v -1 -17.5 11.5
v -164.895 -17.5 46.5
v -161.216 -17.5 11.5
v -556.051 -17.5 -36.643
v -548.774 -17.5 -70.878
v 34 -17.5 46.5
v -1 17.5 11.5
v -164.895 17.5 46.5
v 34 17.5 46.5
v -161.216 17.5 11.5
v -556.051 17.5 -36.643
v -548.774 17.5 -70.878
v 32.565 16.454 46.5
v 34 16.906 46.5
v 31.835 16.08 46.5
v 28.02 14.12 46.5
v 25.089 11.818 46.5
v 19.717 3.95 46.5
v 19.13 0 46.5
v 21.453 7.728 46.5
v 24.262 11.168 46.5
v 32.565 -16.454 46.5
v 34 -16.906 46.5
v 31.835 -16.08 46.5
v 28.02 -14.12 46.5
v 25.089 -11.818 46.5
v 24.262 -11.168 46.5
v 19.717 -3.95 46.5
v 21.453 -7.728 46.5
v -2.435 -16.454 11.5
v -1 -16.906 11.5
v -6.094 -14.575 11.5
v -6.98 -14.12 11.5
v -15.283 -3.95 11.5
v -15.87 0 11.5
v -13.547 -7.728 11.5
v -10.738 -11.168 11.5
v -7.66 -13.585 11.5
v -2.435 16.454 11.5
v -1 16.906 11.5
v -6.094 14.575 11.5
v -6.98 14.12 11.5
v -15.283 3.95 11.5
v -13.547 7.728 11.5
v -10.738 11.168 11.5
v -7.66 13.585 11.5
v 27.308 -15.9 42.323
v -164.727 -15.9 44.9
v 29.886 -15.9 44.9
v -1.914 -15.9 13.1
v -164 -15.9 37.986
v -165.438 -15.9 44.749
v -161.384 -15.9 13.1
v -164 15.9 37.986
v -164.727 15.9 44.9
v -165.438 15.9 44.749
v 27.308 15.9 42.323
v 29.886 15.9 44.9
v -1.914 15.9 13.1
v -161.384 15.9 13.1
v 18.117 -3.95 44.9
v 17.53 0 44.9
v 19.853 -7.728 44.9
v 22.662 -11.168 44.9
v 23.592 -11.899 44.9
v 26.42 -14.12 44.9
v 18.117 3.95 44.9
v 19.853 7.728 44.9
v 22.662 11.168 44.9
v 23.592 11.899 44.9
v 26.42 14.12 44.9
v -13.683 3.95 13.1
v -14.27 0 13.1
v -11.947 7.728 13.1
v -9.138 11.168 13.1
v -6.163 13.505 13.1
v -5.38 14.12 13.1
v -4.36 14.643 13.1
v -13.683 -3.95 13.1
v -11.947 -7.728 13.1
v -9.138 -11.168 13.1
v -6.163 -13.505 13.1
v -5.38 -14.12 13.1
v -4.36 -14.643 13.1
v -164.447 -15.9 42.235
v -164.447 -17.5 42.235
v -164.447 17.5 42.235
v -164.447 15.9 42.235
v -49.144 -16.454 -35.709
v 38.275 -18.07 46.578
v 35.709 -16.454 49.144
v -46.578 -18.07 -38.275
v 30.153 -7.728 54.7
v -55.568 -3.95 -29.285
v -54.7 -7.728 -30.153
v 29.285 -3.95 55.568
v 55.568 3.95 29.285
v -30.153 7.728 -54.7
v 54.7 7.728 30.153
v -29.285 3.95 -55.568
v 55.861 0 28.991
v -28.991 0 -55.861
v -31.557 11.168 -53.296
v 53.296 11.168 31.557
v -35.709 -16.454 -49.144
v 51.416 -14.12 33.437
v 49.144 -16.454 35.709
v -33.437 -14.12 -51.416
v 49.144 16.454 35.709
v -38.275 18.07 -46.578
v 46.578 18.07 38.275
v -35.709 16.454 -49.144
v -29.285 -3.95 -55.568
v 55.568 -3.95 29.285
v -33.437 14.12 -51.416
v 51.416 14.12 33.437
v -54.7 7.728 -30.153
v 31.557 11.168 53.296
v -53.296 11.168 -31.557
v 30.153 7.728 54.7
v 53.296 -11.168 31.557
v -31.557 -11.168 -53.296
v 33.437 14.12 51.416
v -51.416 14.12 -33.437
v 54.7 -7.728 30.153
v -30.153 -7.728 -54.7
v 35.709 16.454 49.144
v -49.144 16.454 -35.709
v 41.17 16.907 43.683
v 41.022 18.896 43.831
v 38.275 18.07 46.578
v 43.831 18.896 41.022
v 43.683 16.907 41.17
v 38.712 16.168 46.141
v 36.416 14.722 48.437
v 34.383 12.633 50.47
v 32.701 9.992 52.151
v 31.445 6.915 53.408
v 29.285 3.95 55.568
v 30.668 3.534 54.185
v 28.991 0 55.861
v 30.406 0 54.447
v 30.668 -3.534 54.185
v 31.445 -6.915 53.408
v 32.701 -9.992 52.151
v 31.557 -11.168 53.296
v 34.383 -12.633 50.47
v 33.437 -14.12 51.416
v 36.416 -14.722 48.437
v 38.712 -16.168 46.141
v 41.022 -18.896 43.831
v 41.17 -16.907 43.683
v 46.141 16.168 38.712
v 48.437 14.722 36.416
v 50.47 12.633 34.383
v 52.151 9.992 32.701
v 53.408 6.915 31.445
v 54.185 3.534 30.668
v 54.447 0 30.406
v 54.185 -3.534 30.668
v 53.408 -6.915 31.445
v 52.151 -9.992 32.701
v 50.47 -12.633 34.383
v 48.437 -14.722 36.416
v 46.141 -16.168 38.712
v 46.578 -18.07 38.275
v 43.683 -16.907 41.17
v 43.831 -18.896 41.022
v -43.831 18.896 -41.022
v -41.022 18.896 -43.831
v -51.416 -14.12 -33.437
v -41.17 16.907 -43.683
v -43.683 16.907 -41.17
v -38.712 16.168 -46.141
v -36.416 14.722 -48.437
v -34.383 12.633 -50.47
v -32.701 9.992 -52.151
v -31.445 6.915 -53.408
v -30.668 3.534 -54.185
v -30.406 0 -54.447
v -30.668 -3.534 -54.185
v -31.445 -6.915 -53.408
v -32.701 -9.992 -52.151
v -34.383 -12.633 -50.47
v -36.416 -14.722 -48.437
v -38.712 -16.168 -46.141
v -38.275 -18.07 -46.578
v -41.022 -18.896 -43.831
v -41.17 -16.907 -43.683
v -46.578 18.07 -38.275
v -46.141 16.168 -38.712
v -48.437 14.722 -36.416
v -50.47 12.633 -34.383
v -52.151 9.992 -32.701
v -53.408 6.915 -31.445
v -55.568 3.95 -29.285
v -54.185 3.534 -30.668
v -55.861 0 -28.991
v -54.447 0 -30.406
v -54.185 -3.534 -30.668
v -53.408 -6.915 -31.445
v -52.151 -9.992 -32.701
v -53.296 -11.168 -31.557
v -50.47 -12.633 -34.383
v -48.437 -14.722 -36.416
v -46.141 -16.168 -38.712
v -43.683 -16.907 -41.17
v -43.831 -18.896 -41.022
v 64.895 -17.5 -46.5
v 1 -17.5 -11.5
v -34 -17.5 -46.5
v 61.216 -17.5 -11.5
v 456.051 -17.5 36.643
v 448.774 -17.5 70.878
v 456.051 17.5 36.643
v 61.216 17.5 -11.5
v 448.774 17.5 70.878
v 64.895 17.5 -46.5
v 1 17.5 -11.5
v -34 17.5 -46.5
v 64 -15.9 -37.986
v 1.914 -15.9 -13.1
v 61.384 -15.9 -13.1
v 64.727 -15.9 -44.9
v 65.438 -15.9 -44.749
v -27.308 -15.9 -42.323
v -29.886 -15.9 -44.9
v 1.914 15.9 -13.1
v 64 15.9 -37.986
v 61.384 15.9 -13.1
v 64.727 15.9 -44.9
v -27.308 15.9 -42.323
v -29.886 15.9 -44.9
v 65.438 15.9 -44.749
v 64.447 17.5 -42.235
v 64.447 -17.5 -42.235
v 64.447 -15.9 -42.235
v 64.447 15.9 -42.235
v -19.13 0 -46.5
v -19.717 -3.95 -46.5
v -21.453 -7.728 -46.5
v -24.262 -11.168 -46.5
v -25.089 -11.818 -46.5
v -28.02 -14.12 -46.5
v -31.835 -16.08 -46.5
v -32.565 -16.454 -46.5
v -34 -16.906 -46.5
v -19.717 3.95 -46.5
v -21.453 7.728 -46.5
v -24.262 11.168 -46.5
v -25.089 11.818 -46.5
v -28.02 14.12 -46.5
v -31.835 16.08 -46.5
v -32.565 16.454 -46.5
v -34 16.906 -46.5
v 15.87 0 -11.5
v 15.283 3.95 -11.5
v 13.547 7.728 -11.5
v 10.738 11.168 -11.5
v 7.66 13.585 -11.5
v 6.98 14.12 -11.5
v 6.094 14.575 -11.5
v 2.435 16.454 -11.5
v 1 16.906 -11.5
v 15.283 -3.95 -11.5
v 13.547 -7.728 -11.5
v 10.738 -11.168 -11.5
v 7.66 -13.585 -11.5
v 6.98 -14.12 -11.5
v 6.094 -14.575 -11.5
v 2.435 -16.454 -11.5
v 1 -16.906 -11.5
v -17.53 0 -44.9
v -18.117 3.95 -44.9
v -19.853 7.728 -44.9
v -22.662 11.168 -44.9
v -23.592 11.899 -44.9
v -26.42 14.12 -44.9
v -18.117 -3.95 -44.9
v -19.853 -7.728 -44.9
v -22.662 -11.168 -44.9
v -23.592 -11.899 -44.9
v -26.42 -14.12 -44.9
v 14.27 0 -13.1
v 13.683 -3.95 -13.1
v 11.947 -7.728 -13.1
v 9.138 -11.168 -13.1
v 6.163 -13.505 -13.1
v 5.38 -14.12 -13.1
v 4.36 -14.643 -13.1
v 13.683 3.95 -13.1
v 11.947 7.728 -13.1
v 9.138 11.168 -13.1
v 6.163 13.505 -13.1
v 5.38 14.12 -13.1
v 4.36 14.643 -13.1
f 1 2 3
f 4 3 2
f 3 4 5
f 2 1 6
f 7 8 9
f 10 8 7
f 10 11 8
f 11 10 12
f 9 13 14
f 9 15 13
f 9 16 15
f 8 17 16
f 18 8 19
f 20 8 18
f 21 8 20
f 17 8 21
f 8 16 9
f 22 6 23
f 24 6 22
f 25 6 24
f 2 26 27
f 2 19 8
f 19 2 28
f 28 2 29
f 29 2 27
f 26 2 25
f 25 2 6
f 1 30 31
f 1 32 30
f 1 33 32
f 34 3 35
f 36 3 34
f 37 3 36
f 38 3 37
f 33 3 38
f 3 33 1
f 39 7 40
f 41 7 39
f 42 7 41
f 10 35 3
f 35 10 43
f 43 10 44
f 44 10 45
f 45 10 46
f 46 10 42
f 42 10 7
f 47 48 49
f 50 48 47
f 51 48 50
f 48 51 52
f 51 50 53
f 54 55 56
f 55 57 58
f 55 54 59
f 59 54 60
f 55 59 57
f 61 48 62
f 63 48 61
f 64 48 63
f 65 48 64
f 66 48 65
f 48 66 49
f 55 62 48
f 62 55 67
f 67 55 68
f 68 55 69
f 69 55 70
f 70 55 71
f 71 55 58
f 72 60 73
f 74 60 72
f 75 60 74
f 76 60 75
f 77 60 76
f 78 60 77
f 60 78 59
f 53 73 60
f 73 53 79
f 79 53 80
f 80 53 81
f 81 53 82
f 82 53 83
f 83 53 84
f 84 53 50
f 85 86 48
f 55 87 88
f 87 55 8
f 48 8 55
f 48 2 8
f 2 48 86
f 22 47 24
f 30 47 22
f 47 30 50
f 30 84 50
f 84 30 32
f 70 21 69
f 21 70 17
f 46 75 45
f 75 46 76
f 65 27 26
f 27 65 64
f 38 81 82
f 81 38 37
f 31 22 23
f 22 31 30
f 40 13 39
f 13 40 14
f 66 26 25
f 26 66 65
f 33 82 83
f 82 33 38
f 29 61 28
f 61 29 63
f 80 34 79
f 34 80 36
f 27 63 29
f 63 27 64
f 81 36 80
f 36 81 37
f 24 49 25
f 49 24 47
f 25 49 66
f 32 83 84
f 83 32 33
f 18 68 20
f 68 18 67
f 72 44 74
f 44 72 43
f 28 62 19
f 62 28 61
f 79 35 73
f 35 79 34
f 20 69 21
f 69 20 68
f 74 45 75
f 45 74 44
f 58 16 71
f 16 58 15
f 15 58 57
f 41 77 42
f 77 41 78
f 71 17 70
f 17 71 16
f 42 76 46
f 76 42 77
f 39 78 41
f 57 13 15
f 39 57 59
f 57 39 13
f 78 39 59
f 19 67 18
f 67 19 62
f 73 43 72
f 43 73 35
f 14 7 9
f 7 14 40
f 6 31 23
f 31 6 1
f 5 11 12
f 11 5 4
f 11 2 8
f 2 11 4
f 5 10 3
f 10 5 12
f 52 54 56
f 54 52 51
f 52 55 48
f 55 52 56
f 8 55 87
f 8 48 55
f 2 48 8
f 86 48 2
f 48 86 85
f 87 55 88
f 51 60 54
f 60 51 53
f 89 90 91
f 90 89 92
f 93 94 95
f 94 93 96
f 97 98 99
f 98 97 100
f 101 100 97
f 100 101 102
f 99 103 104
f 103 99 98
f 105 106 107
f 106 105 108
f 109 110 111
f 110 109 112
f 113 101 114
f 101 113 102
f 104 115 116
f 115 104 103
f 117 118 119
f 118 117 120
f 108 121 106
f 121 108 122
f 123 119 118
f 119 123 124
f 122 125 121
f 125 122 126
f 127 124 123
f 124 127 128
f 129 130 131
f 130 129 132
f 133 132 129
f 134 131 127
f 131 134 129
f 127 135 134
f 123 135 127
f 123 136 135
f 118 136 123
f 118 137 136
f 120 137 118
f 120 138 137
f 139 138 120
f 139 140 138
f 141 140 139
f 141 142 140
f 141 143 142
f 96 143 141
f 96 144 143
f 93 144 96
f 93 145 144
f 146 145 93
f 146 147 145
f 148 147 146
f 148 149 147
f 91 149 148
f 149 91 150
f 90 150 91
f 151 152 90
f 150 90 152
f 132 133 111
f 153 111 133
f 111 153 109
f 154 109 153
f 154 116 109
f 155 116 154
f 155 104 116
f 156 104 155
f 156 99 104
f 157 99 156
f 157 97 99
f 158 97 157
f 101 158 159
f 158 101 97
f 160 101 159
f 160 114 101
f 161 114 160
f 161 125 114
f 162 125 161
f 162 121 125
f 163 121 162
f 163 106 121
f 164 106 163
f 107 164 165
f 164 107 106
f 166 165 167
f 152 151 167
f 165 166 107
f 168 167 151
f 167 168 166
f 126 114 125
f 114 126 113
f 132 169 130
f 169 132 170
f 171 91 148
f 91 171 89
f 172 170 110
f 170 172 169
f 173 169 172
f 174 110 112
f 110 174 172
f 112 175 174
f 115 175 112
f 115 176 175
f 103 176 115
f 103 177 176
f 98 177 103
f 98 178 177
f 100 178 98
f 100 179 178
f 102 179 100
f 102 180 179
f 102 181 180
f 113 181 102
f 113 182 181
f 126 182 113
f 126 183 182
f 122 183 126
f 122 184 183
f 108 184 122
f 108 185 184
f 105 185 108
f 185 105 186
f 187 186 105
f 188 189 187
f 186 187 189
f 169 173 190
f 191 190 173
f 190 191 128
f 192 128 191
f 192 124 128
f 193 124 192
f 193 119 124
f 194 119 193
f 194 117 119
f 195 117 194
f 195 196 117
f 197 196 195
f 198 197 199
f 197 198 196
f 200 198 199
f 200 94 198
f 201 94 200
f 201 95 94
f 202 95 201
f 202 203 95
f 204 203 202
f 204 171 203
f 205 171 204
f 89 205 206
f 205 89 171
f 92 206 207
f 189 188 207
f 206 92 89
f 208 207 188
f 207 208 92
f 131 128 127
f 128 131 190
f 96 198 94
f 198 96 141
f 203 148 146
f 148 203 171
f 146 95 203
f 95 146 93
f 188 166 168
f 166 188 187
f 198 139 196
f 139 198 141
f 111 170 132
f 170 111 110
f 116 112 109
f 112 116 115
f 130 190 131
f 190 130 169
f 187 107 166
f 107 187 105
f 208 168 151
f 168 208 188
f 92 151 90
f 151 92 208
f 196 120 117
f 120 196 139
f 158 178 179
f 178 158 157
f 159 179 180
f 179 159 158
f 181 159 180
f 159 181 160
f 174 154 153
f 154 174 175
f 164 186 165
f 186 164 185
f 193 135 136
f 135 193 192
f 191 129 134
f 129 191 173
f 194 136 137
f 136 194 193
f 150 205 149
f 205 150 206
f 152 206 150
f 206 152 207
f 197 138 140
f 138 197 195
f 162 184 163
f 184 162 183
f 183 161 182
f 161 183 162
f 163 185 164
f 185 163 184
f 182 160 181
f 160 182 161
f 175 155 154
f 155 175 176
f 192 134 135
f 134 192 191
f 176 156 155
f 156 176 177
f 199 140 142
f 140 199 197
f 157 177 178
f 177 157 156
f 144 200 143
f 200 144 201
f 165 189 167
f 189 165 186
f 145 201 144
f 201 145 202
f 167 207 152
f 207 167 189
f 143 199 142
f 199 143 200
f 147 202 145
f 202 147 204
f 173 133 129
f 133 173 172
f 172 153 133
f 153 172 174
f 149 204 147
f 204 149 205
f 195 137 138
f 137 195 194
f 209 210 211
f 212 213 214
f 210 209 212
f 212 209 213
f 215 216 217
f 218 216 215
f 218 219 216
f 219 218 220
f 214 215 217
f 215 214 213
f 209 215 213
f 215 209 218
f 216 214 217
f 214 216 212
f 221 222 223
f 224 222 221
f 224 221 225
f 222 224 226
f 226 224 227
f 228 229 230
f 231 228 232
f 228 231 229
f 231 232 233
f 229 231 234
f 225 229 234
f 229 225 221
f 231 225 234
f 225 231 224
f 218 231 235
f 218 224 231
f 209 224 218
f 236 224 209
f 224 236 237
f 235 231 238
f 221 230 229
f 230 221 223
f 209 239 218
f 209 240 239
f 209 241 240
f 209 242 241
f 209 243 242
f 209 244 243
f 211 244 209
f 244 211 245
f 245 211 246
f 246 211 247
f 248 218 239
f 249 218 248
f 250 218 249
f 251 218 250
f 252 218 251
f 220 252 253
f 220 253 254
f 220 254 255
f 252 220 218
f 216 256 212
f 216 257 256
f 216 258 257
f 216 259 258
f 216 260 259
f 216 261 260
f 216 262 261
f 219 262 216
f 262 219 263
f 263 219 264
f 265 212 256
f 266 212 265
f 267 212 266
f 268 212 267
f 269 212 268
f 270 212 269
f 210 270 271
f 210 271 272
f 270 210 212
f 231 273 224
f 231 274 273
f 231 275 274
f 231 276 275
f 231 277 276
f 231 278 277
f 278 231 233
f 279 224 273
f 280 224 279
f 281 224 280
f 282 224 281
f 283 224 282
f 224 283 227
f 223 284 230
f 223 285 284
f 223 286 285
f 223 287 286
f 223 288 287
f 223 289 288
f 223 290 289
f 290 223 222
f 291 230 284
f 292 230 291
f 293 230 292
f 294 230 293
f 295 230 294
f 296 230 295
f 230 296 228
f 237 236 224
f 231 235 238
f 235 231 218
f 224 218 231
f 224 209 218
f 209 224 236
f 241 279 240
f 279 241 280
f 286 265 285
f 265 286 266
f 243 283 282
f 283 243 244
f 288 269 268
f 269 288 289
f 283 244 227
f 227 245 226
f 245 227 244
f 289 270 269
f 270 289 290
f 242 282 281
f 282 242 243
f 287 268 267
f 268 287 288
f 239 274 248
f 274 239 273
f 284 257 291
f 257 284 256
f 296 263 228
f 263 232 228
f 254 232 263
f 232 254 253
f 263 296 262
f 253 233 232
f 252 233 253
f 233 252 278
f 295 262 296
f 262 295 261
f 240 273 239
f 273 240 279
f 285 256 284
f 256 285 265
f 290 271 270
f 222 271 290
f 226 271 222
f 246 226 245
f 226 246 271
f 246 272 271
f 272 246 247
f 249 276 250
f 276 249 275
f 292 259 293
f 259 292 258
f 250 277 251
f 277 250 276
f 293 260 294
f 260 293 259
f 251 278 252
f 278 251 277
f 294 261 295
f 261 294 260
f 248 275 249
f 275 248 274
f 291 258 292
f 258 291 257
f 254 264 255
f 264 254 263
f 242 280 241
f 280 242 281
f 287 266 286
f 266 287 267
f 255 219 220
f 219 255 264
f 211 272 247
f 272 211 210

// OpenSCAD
mainFrame();

module mainFrame(){
    rear();
    head();
    front();
}

module head() rotate([0,45,0]) translate([0,0,-60]) difference(){
    cylinder(r=19,120);
    translate([0,0,-1]) cylinder(r=17,122);
}

module rear() translate([-165,17.5,12.5]) rotate([90,0,0]){
        translate([0,35,0]) difference(){
            translate([0,-36,0]) cube([200,35,35]);
        translate([-1,-34.4,1.6]) cube([202,31.8,31.8]);
        rotate([0,0,6]) translate([-40,-40,-1]) cube(40);
        translate([213,1,17.5]) rotate([0,0,-45]) 
                rotate([90,0,0]) cylinder(r=19,h=80);
        translate([164,-36,-1]) rotate([0,0,-45]) cube(150);
    }

    translate([0,35,0]) rotate([0,0,12]) difference(){
        translate([-400,-36,0]) cube([400,35,35]);
        translate([-1,-34.4,1.6]) cube([202,31.8,31.8]);
        rotate([0,0,-6]) translate([0,-40,-1]) cube(50);
    }
}

module front () translate([65,17.5,-12.5]) 
            rotate([0,0,180]) rotate([-90,0,0]){
        translate([0,35,0]) difference(){
            translate([0,-36,0]) cube([200,35,35]);
        translate([-1,-34.4,1.6]) cube([202,31.8,31.8]);
        rotate([0,0,6]) translate([-40,-40,-1]) cube(40);
        translate([113,1,17.5]) rotate([0,0,-45]) 
                rotate([90,0,0]) cylinder(r=19,h=80);
        translate([64,-36,-1]) rotate([0,0,-45]) cube(150);
    }

    translate([0,35,0]) rotate([0,0,12]) difference(){
        translate([-400,-36,0]) cube([400,35,35]);
        translate([-1,-34.4,1.6]) cube([202,31.8,31.8]);
        rotate([0,0,-6]) translate([0,-40,-1]) cube(50);
    }
}

module back(){    
    // main seat back 35x1.6 SHS
    translate([-493,0,229]) rotate([0,-45,0]) difference(){
        cube([35,35,450],center=true);                      //  450
        cube([31.8,31.8,452],center=true);
        translate([0,0,-236]) 
                rotate([0,33,0]) cube([100,100,40],center=true);
        translate([0,0,239]) 
                rotate([0,22.5,0]) cube([100,100,40],center=true);
    }
}

module headRest(){
    //  head restraint 35x1.6 SHS
    translate([-647,0,450]) difference(){
        cube([35,35,150],center=true);                      //  150
        cube([31.8,31.8,452],center=true);
        translate([0,0,-89]) 
                rotate([0,-22.5,0]) cube([100,100,40],center=true);
        translate([0,0,87]) 
                rotate([0,-45,0]) cube([100,100,40],center=true);
    }
}
